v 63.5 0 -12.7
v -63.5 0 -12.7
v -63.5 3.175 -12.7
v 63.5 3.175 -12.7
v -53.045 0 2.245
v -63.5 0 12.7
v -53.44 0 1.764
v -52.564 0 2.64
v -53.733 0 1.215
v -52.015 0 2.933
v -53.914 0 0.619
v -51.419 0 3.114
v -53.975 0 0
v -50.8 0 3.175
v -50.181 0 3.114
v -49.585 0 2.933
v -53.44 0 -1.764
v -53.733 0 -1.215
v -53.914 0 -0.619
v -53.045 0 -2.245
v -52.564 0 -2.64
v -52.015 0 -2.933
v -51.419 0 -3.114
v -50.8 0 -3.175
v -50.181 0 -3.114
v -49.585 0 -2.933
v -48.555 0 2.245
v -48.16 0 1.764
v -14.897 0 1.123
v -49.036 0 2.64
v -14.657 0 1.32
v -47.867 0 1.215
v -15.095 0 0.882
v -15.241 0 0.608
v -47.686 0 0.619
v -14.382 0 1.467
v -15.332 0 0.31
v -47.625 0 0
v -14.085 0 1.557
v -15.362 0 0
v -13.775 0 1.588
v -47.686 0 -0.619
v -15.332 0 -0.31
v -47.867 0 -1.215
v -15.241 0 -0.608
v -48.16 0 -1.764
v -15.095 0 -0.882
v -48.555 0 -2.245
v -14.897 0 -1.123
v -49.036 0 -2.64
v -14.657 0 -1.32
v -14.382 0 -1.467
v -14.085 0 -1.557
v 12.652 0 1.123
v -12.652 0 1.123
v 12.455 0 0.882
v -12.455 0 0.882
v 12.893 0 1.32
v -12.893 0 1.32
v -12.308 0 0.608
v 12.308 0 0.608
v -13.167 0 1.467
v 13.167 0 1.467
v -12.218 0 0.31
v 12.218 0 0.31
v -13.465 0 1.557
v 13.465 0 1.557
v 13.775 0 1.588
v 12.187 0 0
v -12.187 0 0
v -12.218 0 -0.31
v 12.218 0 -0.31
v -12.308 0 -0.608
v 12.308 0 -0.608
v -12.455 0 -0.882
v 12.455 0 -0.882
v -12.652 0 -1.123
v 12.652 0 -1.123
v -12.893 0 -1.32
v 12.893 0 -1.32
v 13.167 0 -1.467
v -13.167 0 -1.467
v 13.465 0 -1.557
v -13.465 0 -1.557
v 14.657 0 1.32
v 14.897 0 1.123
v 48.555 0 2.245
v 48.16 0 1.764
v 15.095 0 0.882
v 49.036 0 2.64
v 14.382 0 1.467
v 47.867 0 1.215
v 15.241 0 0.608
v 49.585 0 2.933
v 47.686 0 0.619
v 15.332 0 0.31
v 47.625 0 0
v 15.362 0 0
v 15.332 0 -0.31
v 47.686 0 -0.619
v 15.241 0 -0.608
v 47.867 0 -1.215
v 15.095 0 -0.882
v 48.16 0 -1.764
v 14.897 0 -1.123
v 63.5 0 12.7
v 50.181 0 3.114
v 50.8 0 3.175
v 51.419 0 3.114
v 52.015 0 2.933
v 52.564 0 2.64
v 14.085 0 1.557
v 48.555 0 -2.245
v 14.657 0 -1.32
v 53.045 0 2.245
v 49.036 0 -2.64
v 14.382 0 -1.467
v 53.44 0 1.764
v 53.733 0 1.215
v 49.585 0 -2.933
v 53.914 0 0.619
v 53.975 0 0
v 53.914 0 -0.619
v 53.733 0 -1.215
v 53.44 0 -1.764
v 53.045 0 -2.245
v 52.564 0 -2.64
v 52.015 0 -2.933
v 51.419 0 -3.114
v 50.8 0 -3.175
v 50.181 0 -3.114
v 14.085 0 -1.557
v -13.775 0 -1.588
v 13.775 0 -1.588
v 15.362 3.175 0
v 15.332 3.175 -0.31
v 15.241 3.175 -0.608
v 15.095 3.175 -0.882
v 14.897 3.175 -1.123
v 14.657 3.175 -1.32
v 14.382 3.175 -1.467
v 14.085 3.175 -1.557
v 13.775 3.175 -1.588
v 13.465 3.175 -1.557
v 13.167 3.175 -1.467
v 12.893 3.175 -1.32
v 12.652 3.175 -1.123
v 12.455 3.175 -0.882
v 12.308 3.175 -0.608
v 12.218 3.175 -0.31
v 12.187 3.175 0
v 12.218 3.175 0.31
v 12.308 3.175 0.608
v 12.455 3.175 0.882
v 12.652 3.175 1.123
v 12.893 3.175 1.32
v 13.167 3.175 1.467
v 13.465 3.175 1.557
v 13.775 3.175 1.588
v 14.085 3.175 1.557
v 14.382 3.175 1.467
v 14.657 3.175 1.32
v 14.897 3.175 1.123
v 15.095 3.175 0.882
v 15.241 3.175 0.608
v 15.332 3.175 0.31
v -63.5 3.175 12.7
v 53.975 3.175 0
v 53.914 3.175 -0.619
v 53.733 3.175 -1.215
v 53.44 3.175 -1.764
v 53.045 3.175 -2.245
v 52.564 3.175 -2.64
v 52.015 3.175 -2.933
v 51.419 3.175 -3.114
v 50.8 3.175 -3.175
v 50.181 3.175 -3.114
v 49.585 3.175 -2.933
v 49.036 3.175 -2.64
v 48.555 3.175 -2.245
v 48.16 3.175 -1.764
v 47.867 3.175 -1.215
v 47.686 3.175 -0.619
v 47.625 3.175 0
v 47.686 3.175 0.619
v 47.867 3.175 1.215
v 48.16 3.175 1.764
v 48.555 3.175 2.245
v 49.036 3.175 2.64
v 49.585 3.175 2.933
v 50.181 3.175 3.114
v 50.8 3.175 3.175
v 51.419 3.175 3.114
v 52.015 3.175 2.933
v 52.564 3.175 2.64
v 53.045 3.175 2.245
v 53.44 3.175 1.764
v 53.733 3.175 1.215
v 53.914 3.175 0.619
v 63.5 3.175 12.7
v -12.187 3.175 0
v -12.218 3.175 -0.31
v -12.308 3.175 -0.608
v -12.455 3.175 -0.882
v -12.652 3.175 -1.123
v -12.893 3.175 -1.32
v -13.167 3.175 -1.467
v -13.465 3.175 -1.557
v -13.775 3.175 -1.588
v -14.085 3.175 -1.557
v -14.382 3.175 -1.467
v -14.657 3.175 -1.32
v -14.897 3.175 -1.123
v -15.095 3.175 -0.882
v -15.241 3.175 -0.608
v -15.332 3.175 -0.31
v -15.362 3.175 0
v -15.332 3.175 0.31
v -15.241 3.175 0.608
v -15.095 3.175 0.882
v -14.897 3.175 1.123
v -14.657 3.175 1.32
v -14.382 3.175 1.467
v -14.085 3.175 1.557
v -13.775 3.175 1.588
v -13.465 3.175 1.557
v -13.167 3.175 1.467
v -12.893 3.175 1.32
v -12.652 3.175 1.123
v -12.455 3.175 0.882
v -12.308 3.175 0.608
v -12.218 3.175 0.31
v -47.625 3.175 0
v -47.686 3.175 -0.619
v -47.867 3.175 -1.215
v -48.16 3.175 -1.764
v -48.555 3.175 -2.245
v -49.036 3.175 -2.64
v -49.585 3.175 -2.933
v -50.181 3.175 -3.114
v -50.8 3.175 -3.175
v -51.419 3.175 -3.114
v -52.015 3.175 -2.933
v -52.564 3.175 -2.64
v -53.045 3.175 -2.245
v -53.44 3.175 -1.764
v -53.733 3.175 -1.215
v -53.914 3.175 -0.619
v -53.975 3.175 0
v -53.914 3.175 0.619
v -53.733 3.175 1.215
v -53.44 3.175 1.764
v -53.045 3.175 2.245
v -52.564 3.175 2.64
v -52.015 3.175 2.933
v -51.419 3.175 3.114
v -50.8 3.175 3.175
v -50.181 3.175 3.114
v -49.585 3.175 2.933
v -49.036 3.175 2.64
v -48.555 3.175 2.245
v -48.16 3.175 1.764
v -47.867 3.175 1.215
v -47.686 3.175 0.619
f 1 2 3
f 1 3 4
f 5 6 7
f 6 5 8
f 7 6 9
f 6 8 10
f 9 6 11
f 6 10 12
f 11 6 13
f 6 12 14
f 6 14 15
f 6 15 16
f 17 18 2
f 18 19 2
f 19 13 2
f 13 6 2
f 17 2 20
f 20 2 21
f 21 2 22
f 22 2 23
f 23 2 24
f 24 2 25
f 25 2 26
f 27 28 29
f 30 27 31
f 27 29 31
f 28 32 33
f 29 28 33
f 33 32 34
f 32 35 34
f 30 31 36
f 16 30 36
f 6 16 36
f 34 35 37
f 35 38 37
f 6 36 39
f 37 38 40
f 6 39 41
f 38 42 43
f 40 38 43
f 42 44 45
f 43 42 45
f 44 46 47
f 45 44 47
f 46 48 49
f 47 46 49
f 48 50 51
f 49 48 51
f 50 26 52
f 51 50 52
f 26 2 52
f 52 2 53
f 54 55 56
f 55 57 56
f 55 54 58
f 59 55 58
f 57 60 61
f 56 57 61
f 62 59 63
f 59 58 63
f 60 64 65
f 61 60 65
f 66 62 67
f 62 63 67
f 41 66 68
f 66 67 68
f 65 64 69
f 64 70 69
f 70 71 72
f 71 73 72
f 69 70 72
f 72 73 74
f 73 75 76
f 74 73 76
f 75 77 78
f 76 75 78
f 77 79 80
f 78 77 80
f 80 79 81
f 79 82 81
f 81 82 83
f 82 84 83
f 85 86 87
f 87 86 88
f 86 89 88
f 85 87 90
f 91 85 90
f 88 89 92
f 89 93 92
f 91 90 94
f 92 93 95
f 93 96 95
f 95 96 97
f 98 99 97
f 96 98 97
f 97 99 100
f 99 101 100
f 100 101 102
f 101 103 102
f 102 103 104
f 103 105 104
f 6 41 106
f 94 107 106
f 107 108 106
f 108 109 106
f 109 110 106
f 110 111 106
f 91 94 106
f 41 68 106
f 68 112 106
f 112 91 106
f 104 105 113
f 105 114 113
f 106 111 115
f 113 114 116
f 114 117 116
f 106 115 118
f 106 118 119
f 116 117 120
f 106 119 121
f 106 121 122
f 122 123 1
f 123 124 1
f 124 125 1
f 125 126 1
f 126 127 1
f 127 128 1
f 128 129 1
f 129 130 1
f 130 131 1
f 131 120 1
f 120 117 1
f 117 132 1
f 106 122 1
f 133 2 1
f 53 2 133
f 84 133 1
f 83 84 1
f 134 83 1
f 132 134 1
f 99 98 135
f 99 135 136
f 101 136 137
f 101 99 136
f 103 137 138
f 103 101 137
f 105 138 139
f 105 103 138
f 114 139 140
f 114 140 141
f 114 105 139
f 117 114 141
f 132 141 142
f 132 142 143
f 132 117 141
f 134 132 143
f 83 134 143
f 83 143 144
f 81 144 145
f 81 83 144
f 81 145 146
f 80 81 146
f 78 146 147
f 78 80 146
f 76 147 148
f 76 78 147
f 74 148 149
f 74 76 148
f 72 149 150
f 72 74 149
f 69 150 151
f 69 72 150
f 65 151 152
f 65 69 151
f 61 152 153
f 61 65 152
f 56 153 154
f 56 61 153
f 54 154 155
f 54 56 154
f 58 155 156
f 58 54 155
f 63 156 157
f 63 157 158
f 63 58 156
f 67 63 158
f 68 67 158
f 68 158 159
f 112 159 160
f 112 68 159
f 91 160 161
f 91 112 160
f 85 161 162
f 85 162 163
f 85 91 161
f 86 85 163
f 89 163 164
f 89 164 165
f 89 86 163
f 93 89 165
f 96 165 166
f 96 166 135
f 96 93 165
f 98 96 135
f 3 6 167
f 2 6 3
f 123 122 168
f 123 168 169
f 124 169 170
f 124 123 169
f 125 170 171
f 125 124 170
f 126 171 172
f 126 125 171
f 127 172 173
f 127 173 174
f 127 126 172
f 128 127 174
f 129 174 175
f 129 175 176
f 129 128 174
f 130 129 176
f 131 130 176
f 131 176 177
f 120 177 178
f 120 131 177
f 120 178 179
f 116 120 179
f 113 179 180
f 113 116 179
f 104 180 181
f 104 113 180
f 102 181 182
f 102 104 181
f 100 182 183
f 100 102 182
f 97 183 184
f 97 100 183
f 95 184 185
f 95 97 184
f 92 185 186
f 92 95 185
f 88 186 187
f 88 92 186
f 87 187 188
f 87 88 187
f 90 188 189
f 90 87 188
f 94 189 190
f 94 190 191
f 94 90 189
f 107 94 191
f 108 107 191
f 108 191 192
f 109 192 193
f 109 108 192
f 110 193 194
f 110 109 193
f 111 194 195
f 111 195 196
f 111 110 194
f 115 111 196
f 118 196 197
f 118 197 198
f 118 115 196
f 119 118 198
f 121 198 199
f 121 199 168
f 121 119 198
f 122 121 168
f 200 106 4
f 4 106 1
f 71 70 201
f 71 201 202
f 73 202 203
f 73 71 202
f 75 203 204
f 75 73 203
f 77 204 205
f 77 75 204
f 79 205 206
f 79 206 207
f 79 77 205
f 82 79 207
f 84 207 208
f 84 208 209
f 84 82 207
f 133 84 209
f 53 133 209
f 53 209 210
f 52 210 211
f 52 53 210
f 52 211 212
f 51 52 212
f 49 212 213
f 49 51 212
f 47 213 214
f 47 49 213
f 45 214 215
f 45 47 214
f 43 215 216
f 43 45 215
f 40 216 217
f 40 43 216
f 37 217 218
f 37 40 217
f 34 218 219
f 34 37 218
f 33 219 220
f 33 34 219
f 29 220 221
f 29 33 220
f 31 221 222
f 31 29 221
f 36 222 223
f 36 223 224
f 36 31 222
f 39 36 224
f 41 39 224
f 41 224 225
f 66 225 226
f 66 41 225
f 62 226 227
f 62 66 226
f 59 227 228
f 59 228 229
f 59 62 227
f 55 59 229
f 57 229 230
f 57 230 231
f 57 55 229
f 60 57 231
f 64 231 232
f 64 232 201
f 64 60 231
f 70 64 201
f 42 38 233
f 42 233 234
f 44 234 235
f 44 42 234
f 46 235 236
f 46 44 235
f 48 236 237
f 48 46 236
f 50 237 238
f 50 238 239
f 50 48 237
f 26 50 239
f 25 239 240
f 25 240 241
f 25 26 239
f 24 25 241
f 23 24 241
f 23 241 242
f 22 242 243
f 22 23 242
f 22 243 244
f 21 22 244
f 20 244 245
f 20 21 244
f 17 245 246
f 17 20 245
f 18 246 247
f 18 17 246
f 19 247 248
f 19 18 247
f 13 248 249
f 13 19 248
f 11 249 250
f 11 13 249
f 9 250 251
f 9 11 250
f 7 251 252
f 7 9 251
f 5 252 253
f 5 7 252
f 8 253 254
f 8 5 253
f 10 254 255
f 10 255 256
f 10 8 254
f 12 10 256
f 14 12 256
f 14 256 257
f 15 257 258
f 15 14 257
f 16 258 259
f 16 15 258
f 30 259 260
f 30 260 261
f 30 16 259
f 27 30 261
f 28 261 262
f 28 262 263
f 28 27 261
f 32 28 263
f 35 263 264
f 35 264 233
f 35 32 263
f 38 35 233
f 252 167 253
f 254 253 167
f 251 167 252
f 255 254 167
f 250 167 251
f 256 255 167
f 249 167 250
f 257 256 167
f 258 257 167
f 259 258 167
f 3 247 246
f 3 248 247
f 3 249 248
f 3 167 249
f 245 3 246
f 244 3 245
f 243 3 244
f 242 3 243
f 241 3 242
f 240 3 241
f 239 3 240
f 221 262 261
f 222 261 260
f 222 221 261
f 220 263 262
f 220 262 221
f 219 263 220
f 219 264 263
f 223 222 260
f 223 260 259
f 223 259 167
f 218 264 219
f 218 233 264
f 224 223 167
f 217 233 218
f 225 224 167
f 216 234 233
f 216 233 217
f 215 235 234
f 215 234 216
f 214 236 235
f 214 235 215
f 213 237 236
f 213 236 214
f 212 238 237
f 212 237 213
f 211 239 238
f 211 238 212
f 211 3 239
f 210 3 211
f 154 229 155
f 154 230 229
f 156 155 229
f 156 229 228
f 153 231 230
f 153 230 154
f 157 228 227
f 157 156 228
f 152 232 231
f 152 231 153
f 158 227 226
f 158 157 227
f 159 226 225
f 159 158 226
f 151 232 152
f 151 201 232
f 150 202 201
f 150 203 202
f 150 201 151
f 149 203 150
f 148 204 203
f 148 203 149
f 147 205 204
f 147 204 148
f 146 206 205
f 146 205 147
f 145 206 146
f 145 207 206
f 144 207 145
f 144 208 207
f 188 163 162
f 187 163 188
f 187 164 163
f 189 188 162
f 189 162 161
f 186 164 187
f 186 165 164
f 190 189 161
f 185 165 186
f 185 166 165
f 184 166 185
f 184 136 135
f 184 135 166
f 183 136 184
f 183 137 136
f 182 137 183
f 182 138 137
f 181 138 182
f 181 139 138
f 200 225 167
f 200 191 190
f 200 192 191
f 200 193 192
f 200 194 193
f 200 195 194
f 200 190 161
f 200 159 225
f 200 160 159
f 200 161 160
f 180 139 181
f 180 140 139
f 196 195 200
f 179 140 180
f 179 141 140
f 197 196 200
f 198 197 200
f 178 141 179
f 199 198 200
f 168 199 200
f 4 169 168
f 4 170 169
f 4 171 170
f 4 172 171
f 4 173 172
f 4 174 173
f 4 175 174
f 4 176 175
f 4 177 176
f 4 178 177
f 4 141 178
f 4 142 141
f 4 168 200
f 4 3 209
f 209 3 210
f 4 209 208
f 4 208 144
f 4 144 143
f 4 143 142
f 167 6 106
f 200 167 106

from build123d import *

# Parameters (mm, degrees)
SKETCH1_W           = 127
SKETCH1_H           = 25.4
SKETCH1_R           = 3.175
SKETCH1_R_2         = 1.5875
BOSS_EXTRUDE1_DEPTH = 3.175


with BuildPart() as part:
    # Sketch1 → Boss-Extrude1 (new body)
    with BuildSketch(Plane(origin=(0, 0, 0), x_dir=(1, 0, 0), z_dir=(0, 1, 0))):
        Rectangle(SKETCH1_W, SKETCH1_H)
        with Locations((-50.8, 0)):
            Circle(SKETCH1_R, mode=Mode.SUBTRACT)
        with Locations((50.8, 0)):
            Circle(SKETCH1_R, mode=Mode.SUBTRACT)
        with Locations((-13.774801, 0)):
            Circle(SKETCH1_R_2, mode=Mode.SUBTRACT)
        with Locations((13.774801, 0)):
            Circle(SKETCH1_R_2, mode=Mode.SUBTRACT)
    extrude(amount=BOSS_EXTRUDE1_DEPTH)


solid = part.part
